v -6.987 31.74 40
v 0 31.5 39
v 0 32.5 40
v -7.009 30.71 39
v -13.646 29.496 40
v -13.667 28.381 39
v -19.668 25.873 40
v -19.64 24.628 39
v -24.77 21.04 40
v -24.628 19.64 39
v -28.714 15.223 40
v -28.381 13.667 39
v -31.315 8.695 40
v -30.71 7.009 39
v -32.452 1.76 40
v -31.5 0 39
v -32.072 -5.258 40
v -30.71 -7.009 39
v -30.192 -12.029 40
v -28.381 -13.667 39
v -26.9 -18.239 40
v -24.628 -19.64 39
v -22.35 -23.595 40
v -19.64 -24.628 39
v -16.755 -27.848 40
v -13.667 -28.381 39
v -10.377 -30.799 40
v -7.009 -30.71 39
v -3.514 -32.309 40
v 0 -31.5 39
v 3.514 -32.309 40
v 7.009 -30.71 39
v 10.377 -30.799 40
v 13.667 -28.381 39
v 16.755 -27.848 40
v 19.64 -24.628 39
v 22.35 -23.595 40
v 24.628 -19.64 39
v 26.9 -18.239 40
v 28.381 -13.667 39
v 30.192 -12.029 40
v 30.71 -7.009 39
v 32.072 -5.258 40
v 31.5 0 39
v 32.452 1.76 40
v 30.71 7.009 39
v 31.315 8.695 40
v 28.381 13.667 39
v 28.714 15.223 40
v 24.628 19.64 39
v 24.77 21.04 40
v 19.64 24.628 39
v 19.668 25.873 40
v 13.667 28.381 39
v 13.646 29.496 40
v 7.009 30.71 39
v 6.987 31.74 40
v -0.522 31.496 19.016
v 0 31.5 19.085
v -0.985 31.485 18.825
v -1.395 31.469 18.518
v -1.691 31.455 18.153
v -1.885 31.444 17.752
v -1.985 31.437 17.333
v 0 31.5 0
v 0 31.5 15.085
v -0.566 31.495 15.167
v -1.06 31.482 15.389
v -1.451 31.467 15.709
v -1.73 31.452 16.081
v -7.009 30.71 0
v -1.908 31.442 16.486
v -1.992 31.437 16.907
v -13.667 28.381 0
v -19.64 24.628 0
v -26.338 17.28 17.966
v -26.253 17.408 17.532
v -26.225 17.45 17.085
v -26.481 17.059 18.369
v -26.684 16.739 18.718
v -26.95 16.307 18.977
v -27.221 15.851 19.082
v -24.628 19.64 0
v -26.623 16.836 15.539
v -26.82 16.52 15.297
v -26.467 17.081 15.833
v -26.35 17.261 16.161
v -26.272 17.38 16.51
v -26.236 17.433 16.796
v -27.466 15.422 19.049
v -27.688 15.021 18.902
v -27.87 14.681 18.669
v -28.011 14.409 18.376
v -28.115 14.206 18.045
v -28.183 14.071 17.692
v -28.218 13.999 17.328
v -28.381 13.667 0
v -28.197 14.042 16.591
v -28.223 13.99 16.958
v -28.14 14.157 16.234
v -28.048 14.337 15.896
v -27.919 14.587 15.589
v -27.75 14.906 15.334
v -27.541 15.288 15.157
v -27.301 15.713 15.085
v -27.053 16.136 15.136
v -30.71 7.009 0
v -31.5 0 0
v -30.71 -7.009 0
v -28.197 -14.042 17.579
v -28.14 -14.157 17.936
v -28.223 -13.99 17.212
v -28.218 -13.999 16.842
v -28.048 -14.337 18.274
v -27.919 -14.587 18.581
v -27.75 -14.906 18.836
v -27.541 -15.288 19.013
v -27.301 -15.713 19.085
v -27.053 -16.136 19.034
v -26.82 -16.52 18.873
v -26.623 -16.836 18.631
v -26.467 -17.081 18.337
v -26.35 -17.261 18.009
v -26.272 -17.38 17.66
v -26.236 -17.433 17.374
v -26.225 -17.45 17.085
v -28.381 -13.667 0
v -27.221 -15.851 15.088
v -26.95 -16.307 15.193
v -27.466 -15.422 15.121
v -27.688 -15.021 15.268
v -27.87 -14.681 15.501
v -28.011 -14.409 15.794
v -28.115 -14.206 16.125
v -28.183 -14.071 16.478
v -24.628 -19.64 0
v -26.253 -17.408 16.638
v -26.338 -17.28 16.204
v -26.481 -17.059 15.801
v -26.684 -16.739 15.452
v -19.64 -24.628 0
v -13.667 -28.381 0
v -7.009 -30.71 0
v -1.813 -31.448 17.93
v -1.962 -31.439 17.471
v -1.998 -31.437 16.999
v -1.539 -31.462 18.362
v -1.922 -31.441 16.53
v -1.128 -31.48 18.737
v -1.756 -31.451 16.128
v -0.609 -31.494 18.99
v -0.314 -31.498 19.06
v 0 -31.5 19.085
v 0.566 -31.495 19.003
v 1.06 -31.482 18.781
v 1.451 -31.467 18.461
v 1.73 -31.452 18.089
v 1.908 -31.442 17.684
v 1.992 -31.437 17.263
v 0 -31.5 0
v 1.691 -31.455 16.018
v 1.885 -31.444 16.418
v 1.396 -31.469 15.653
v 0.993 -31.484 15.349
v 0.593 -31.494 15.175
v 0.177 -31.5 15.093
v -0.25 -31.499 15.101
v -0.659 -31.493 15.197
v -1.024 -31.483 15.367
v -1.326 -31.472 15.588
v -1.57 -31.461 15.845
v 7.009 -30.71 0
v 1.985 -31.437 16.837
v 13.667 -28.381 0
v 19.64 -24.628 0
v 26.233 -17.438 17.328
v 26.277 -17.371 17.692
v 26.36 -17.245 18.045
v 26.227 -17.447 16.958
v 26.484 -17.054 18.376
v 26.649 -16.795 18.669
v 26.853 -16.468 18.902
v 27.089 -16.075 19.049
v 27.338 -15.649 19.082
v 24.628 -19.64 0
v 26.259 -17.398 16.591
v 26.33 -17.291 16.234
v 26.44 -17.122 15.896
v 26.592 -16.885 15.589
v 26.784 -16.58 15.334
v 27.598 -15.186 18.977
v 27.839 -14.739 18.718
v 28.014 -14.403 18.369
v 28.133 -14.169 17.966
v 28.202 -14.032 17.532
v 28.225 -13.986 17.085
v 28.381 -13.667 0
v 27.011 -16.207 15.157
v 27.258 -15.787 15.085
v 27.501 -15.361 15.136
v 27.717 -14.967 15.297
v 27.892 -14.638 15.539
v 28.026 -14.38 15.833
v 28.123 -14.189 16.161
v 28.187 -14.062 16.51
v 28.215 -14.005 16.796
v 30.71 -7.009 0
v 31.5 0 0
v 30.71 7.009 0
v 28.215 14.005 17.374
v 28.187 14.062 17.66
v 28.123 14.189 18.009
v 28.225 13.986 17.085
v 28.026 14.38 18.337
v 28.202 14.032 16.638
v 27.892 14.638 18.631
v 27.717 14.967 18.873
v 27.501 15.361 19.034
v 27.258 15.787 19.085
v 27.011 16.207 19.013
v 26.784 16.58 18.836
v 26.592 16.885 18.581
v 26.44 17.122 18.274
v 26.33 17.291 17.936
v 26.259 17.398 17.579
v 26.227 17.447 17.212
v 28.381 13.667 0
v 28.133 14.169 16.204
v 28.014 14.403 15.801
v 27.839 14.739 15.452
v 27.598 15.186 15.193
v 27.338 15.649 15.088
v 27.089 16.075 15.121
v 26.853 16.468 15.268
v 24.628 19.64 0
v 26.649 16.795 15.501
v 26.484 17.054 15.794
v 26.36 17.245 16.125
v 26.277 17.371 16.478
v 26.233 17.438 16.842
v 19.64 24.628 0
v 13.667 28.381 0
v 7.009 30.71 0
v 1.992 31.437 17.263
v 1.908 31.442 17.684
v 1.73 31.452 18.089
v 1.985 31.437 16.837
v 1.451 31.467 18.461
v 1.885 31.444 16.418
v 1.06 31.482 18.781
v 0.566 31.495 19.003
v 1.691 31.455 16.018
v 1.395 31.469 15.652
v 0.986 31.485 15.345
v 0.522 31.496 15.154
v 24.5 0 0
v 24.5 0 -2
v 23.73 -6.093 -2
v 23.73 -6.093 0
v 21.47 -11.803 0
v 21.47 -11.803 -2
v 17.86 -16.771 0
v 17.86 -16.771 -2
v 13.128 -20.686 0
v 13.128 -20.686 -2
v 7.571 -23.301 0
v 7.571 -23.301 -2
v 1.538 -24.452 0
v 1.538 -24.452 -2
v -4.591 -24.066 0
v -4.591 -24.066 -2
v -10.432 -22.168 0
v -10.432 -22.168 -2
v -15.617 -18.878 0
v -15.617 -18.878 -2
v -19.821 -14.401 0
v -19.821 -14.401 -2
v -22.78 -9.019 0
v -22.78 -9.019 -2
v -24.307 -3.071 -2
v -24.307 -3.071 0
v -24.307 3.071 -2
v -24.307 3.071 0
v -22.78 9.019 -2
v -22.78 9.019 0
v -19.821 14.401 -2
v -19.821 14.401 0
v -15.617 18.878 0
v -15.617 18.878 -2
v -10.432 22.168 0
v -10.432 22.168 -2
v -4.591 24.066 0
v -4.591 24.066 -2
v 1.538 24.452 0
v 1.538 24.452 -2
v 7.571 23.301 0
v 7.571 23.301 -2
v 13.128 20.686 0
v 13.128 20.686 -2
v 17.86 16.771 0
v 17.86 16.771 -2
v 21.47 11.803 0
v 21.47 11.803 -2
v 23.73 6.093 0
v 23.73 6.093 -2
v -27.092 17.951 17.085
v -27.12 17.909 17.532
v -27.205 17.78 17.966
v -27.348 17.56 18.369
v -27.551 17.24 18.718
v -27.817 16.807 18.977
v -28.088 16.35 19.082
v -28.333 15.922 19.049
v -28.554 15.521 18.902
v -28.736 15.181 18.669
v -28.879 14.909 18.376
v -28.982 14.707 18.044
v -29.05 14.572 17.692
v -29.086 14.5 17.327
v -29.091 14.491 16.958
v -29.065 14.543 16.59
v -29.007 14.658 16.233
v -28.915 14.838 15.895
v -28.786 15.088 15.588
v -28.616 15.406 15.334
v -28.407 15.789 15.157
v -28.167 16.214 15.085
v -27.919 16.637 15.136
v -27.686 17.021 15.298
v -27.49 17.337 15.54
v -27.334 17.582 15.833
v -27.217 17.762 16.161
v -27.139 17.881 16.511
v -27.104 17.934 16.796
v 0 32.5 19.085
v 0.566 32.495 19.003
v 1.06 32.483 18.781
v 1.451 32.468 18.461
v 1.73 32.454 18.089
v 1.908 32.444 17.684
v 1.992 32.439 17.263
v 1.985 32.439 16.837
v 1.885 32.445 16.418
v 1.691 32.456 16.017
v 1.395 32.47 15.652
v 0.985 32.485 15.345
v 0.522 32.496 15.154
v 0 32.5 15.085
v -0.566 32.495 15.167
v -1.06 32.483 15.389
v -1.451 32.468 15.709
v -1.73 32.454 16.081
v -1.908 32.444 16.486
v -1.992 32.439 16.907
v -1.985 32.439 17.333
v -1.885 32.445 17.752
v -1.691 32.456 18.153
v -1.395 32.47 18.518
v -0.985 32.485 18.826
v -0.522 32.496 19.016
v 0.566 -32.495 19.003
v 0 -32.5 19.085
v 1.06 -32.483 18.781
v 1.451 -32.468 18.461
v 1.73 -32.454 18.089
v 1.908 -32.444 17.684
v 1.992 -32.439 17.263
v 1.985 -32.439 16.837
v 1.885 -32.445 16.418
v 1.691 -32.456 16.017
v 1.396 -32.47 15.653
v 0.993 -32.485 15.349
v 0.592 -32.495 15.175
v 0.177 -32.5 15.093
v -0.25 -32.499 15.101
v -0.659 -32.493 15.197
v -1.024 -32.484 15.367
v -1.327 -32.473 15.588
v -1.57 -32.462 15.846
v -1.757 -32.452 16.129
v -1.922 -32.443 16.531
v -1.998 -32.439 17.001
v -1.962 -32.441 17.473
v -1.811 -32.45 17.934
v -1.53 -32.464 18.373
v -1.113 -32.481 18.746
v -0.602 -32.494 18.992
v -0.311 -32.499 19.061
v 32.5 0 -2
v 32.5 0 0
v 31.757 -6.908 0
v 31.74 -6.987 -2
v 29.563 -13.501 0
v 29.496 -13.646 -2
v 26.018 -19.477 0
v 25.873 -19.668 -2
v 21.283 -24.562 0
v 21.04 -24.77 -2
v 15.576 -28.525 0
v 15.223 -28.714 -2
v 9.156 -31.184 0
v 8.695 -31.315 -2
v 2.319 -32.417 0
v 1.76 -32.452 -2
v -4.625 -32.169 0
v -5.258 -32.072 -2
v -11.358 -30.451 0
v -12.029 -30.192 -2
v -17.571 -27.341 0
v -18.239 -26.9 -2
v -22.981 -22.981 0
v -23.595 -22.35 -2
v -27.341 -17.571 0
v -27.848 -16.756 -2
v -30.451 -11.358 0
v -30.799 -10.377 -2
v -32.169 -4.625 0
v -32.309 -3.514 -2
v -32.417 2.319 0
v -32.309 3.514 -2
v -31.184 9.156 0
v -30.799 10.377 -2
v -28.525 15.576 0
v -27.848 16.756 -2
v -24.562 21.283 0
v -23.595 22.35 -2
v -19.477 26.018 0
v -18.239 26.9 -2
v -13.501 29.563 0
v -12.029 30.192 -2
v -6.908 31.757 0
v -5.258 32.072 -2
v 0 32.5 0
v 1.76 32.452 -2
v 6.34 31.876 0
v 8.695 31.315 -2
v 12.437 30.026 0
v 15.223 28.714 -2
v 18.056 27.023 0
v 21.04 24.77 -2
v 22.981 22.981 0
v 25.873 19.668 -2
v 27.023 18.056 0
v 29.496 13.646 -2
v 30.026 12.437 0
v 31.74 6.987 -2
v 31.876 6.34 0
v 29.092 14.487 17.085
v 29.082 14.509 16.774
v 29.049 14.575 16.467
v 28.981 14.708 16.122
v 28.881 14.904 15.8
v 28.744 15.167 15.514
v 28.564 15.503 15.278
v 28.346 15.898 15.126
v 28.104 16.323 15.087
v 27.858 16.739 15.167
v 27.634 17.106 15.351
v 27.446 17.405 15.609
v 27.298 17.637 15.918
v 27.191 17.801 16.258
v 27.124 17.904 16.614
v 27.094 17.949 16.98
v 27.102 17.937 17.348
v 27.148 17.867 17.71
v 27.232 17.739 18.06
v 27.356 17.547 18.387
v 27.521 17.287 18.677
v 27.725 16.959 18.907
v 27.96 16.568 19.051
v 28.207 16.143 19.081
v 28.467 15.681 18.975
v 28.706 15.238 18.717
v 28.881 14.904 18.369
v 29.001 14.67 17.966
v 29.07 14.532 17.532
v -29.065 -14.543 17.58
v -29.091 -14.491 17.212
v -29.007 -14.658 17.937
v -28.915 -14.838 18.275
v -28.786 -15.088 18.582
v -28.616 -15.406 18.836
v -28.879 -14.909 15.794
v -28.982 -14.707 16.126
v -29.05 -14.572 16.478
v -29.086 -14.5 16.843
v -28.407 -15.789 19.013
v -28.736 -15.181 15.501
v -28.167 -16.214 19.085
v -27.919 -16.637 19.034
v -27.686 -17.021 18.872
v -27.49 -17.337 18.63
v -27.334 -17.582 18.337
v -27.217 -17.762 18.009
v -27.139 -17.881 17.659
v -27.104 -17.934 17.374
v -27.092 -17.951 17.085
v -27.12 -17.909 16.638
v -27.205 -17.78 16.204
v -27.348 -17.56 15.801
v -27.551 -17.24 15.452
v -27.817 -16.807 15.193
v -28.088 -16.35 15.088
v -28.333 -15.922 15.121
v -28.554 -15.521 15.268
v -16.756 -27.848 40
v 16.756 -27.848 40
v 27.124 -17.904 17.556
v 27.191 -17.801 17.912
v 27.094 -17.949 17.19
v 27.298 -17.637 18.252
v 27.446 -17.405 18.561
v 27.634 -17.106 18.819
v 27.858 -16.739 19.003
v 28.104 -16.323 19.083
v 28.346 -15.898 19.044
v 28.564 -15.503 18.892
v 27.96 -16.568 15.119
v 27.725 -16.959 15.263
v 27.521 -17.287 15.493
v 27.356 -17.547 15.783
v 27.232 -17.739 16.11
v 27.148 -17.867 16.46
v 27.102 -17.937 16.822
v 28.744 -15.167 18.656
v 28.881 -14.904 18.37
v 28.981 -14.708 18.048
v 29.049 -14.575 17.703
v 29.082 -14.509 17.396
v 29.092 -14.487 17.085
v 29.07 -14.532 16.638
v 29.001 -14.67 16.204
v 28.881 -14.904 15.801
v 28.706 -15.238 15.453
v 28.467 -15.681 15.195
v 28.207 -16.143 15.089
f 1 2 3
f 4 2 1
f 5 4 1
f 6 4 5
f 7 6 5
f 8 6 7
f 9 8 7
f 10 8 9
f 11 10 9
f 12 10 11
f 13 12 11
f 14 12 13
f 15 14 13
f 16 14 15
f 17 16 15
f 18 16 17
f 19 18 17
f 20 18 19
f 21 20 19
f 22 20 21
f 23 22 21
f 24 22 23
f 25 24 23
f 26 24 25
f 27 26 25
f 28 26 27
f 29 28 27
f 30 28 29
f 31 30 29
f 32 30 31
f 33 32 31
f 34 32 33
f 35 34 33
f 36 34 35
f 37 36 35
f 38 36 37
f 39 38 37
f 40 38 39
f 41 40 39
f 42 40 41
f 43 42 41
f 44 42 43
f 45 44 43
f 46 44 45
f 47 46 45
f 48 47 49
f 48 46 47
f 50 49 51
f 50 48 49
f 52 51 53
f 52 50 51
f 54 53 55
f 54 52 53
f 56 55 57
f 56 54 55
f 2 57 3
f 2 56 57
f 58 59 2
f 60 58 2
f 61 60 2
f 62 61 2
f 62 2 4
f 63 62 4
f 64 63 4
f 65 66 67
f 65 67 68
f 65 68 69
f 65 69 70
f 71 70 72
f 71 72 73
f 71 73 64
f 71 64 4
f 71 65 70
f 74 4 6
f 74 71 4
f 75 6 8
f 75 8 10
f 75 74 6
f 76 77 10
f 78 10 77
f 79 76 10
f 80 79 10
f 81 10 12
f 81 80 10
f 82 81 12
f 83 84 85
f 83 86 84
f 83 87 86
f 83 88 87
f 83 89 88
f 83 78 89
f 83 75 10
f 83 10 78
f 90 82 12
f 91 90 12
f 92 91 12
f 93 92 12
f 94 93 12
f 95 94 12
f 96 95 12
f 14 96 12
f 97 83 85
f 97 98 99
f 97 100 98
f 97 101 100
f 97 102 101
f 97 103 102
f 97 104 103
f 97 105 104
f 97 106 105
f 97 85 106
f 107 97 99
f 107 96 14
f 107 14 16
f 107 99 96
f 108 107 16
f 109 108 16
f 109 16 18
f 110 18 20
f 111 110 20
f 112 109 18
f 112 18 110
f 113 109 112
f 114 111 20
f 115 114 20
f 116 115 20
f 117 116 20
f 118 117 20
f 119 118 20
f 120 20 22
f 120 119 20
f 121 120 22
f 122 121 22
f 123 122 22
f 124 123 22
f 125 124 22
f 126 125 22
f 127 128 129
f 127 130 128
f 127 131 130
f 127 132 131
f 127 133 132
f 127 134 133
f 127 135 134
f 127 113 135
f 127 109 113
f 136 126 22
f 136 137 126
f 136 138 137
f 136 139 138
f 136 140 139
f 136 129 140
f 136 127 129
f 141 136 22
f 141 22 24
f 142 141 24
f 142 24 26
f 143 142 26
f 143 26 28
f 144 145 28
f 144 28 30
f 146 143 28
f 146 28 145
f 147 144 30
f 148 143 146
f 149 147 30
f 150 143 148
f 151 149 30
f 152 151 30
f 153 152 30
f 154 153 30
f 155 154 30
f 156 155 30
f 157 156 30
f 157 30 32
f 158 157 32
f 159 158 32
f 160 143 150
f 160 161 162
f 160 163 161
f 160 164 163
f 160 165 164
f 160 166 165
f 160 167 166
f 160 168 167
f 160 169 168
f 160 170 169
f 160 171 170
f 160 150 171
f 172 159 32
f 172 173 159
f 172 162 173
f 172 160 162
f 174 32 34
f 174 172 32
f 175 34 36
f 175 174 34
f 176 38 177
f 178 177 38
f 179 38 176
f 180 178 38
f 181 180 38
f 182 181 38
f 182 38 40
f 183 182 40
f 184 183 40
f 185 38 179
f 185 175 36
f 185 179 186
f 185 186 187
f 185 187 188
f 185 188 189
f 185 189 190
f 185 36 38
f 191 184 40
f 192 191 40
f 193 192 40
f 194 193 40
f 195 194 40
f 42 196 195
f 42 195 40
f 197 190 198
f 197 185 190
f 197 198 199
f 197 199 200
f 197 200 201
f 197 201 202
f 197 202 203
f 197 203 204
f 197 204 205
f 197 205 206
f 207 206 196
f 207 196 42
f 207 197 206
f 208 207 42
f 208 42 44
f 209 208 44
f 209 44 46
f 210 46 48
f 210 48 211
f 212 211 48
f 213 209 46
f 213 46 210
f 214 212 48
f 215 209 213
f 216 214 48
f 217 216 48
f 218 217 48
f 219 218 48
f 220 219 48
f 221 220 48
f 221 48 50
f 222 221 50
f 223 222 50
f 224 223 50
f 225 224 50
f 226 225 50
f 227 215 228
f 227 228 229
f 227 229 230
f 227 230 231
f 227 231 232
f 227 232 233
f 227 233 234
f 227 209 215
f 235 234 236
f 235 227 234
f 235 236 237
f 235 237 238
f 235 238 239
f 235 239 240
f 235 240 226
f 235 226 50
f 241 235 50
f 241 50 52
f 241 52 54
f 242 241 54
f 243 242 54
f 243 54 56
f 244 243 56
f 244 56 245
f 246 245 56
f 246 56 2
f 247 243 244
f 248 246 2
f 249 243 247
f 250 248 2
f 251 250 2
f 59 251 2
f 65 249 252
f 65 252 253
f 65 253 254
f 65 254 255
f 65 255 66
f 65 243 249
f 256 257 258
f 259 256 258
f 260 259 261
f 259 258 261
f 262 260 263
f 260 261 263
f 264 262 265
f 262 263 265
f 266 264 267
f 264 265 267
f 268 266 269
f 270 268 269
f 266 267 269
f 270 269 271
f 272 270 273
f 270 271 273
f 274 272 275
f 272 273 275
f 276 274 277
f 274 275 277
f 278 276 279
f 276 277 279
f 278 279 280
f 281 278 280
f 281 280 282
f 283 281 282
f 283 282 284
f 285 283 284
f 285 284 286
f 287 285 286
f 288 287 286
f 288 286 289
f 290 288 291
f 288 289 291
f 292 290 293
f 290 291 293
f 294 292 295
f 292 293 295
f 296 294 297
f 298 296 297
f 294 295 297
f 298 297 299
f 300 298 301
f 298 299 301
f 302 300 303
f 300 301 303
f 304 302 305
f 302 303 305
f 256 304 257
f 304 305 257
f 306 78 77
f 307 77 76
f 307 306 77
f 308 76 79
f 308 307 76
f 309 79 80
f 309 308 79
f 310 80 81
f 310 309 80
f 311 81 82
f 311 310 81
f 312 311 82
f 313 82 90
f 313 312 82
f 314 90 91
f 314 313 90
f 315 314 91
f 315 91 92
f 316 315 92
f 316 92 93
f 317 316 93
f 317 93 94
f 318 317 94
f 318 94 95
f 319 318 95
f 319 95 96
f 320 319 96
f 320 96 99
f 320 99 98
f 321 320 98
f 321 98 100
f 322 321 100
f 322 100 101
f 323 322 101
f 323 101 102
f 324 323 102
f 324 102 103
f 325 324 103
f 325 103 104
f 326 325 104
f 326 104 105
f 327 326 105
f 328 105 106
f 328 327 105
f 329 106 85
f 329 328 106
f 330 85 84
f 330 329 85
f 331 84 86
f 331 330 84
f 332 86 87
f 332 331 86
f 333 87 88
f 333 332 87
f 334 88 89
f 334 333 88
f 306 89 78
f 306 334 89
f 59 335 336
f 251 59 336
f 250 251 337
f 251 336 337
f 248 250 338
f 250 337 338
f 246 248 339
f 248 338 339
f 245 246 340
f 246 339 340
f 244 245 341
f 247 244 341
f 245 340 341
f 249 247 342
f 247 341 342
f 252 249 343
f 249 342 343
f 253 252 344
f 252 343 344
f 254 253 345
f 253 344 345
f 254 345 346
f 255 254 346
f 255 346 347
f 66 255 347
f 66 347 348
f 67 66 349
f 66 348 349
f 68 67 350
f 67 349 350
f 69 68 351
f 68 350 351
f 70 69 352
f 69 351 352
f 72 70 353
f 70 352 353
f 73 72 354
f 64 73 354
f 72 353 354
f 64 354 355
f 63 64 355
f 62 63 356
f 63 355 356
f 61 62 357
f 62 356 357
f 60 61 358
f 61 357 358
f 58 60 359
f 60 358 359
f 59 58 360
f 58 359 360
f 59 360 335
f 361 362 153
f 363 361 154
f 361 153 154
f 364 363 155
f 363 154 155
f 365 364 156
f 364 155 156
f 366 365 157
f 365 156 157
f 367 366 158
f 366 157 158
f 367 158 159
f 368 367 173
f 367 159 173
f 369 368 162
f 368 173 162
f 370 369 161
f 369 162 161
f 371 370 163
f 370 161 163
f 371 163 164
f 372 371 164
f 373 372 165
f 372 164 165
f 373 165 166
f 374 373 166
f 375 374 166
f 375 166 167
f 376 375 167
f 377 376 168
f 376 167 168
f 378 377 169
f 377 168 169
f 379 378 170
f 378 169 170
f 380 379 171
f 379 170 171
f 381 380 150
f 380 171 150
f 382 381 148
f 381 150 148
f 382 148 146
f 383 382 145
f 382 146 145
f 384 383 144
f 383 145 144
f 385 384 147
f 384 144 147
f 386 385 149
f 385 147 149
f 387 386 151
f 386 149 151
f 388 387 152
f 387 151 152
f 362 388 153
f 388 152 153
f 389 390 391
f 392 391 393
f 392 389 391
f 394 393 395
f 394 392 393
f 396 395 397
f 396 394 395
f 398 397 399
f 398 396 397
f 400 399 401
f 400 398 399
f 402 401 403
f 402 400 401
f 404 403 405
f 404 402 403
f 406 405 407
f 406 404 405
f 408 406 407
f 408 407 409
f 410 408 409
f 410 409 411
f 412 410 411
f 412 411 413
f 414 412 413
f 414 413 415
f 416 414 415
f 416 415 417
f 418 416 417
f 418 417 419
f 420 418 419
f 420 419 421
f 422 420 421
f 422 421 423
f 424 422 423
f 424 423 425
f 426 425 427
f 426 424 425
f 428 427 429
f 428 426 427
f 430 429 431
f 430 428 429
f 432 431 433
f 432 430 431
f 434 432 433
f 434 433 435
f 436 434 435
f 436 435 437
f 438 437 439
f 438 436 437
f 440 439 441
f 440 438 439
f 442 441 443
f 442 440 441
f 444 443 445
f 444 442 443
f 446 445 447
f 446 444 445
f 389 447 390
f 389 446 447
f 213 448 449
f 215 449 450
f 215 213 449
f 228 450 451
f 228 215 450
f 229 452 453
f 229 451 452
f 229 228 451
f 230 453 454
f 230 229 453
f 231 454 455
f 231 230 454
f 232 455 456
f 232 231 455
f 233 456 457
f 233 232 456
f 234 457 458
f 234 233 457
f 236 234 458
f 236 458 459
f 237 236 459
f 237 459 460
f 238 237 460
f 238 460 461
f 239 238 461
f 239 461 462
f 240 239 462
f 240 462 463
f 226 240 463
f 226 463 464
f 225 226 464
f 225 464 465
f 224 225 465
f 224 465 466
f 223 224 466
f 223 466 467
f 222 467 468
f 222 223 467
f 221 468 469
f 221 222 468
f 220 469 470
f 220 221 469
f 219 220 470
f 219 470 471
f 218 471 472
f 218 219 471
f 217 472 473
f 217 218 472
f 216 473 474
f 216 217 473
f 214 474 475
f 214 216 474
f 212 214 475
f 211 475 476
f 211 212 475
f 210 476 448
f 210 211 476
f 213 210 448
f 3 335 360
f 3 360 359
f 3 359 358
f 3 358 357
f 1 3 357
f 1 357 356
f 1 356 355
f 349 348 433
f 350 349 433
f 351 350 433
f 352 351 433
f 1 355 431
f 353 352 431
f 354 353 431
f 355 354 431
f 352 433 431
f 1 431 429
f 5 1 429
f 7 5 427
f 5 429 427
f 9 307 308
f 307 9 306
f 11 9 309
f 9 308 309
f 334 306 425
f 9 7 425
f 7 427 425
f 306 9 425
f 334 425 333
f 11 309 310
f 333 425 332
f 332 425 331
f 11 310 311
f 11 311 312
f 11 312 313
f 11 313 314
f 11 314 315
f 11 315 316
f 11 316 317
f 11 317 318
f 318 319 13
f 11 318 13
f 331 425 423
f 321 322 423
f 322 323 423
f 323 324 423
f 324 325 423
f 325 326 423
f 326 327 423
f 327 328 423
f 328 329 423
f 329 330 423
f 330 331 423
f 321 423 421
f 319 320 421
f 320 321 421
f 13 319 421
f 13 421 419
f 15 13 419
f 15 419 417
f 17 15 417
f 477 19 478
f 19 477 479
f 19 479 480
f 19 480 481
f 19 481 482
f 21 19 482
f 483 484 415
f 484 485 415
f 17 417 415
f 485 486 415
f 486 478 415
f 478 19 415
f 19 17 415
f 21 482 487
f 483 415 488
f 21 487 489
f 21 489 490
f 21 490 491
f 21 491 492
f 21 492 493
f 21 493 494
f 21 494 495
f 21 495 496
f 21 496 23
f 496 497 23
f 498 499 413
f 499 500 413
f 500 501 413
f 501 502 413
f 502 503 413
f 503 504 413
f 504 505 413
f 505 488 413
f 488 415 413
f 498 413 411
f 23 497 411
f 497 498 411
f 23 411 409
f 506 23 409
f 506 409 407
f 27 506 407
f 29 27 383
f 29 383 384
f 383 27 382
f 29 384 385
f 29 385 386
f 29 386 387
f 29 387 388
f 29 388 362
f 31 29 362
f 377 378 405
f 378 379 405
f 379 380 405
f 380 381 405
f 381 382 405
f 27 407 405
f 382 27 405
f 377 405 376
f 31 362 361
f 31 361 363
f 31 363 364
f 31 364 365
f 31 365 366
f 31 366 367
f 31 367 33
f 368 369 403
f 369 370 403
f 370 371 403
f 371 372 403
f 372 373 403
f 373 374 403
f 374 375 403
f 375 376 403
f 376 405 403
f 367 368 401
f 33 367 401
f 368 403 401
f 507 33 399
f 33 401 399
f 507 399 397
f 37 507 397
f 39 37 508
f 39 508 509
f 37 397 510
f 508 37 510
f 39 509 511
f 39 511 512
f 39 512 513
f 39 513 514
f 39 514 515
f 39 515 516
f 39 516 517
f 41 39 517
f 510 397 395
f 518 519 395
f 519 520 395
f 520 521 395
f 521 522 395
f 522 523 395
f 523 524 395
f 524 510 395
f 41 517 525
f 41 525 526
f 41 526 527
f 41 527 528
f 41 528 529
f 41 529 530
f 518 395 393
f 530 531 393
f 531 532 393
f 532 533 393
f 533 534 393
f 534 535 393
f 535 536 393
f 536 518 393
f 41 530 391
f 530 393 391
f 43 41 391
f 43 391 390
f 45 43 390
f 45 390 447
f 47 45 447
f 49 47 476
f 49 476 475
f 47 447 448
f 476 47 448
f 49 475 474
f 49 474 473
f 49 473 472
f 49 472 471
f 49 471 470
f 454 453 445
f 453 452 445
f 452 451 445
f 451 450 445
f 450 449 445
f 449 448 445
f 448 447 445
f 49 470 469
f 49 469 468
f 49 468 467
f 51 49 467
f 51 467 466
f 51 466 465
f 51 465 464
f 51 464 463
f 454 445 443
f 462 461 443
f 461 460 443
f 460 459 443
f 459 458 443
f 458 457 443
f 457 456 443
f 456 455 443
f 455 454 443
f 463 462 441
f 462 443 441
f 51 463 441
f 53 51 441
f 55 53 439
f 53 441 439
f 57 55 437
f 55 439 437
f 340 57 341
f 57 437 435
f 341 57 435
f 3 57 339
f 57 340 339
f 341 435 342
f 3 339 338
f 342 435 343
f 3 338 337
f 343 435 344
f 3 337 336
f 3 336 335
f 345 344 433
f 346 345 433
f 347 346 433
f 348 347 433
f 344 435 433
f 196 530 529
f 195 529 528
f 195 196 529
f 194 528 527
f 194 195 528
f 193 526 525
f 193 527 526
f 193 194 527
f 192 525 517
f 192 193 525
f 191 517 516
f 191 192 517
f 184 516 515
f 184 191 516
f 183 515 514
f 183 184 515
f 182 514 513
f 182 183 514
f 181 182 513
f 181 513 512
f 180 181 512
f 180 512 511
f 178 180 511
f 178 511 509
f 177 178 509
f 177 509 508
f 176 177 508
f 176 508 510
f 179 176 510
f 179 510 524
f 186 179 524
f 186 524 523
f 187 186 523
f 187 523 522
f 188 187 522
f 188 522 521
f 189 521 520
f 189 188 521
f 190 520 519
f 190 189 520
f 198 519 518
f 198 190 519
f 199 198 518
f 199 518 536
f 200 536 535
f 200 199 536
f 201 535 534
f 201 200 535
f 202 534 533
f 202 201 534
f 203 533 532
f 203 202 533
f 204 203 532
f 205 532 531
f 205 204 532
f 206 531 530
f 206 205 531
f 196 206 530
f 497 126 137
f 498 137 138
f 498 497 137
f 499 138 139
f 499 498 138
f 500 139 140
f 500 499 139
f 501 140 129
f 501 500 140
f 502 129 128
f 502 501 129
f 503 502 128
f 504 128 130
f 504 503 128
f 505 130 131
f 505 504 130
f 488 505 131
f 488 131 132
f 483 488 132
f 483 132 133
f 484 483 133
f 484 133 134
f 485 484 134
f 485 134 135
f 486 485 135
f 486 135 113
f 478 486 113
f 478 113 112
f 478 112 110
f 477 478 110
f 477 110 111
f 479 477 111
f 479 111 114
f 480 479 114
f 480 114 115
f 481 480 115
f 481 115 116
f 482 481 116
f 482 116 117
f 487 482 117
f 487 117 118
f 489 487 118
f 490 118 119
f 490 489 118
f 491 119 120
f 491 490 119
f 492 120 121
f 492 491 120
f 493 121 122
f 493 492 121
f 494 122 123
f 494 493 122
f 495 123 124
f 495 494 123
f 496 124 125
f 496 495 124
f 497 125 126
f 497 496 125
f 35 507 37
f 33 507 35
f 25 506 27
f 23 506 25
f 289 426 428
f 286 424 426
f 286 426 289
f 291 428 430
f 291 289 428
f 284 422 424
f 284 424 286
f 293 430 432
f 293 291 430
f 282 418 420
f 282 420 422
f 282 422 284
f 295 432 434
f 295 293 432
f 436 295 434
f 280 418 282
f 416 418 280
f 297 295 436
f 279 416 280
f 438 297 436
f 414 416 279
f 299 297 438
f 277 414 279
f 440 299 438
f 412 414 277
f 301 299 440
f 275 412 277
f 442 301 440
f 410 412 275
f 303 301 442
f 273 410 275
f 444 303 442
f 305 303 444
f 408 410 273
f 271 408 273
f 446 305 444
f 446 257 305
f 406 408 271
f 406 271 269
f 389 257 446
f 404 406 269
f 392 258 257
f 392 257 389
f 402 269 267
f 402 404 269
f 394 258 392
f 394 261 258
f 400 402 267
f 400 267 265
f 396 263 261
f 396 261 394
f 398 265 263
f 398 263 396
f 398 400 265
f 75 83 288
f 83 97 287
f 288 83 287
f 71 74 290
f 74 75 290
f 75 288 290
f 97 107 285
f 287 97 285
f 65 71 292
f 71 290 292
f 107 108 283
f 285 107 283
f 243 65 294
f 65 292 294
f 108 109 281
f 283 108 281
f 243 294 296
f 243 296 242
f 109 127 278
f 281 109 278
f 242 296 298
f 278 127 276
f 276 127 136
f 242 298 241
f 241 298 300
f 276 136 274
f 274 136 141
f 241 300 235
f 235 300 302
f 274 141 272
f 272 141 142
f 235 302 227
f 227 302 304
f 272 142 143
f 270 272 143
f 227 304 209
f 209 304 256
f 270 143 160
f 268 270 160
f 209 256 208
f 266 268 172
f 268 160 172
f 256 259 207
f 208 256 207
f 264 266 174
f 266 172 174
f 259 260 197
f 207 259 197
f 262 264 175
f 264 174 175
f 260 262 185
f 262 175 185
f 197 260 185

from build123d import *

# Parameters (mm, degrees)
SKETCH1_R               = 32.5
SKETCH1_R_2             = 31.5
EXTRUDE_THIN1_DEPTH     = 40
SKETCH2_R               = 2
CUT_EXTRUDE1_DEPTH      = 61.930288035
CIRPATTERN1_START       = -32.500000066
CIRPATTERN1_OUTLINE_R   = 2
CIRPATTERN1_DEPTH       = 65.000000132
CIRPATTERN1_2_OUTLINE_R = 2
CIRPATTERN1_2_DEPTH     = 65.000000132
EXTRUDE_THIN2_START     = 2
SKETCH3_R               = 32.5
SKETCH3_R_2             = 24.5
EXTRUDE_THIN2_DEPTH     = 2
CHAMFER1_SIZE           = 1


# Read off the part's stored shape, not the designer's step: CirPattern1
with BuildPart() as part:
    # Sketch1 → Extrude-Thin1 (new body)
    with BuildSketch(Plane(origin=(0, 0, 0), x_dir=(0, 1, 0), z_dir=(0, 0, 1))):
        Circle(SKETCH1_R)
        Circle(SKETCH1_R_2, mode=Mode.SUBTRACT)
    extrude(amount=EXTRUDE_THIN1_DEPTH)

    # Sketch2 → Cut-Extrude1 (cut, symmetric)
    with BuildSketch(Plane(origin=(0, 0, 0), x_dir=(-1, 0, 0), z_dir=(0, 1, 0))):
        with Locations(Location((0, 17.085, 0), (0, 0, 90))):
            Circle(SKETCH2_R)
    extrude(amount=CUT_EXTRUDE1_DEPTH, both=True, mode=Mode.SUBTRACT)

    # CirPattern1 outline → CirPattern1 (cut)
    with BuildSketch(Plane(origin=(0, 0, 0), x_dir=(0.500000000000004, -0.8660254037844363, 0), z_dir=(0.8660254037844363, 0.5000000000000042, 0)).offset(CIRPATTERN1_START)):
        with Locations((0, -17.085)):
            Circle(CIRPATTERN1_OUTLINE_R)
    extrude(amount=CIRPATTERN1_DEPTH, mode=Mode.SUBTRACT)

    # CirPattern1 2 outline → CirPattern1 2 (cut)
    with BuildSketch(Plane(origin=(0, 0, 0), x_dir=(0.49999999999999767, 0.86602540378444, 0), z_dir=(0.8660254037844399, -0.49999999999999795, 0)).offset(CIRPATTERN1_START)):
        with Locations((0, 17.085)):
            Circle(CIRPATTERN1_2_OUTLINE_R)
    extrude(amount=CIRPATTERN1_2_DEPTH, mode=Mode.SUBTRACT)

    # Sketch3 → Extrude-Thin2 (add)
    with BuildSketch(Plane(origin=(0, 0, 0), x_dir=(1, 0, 0), z_dir=(0, 0, -1)).offset(EXTRUDE_THIN2_START)):
        Circle(SKETCH3_R)
        Circle(SKETCH3_R_2, mode=Mode.SUBTRACT)
    extrude(amount=-EXTRUDE_THIN2_DEPTH)

    # Chamfer1
    chamfer1_edges = [part.edges().sort_by_distance(p)[0] for p in [
        (0, -31.5, 40),
    ]]
    chamfer(chamfer1_edges, length=CHAMFER1_SIZE - 0.0001)  # a hair under: the kernel refuses the full size


solid = part.part
